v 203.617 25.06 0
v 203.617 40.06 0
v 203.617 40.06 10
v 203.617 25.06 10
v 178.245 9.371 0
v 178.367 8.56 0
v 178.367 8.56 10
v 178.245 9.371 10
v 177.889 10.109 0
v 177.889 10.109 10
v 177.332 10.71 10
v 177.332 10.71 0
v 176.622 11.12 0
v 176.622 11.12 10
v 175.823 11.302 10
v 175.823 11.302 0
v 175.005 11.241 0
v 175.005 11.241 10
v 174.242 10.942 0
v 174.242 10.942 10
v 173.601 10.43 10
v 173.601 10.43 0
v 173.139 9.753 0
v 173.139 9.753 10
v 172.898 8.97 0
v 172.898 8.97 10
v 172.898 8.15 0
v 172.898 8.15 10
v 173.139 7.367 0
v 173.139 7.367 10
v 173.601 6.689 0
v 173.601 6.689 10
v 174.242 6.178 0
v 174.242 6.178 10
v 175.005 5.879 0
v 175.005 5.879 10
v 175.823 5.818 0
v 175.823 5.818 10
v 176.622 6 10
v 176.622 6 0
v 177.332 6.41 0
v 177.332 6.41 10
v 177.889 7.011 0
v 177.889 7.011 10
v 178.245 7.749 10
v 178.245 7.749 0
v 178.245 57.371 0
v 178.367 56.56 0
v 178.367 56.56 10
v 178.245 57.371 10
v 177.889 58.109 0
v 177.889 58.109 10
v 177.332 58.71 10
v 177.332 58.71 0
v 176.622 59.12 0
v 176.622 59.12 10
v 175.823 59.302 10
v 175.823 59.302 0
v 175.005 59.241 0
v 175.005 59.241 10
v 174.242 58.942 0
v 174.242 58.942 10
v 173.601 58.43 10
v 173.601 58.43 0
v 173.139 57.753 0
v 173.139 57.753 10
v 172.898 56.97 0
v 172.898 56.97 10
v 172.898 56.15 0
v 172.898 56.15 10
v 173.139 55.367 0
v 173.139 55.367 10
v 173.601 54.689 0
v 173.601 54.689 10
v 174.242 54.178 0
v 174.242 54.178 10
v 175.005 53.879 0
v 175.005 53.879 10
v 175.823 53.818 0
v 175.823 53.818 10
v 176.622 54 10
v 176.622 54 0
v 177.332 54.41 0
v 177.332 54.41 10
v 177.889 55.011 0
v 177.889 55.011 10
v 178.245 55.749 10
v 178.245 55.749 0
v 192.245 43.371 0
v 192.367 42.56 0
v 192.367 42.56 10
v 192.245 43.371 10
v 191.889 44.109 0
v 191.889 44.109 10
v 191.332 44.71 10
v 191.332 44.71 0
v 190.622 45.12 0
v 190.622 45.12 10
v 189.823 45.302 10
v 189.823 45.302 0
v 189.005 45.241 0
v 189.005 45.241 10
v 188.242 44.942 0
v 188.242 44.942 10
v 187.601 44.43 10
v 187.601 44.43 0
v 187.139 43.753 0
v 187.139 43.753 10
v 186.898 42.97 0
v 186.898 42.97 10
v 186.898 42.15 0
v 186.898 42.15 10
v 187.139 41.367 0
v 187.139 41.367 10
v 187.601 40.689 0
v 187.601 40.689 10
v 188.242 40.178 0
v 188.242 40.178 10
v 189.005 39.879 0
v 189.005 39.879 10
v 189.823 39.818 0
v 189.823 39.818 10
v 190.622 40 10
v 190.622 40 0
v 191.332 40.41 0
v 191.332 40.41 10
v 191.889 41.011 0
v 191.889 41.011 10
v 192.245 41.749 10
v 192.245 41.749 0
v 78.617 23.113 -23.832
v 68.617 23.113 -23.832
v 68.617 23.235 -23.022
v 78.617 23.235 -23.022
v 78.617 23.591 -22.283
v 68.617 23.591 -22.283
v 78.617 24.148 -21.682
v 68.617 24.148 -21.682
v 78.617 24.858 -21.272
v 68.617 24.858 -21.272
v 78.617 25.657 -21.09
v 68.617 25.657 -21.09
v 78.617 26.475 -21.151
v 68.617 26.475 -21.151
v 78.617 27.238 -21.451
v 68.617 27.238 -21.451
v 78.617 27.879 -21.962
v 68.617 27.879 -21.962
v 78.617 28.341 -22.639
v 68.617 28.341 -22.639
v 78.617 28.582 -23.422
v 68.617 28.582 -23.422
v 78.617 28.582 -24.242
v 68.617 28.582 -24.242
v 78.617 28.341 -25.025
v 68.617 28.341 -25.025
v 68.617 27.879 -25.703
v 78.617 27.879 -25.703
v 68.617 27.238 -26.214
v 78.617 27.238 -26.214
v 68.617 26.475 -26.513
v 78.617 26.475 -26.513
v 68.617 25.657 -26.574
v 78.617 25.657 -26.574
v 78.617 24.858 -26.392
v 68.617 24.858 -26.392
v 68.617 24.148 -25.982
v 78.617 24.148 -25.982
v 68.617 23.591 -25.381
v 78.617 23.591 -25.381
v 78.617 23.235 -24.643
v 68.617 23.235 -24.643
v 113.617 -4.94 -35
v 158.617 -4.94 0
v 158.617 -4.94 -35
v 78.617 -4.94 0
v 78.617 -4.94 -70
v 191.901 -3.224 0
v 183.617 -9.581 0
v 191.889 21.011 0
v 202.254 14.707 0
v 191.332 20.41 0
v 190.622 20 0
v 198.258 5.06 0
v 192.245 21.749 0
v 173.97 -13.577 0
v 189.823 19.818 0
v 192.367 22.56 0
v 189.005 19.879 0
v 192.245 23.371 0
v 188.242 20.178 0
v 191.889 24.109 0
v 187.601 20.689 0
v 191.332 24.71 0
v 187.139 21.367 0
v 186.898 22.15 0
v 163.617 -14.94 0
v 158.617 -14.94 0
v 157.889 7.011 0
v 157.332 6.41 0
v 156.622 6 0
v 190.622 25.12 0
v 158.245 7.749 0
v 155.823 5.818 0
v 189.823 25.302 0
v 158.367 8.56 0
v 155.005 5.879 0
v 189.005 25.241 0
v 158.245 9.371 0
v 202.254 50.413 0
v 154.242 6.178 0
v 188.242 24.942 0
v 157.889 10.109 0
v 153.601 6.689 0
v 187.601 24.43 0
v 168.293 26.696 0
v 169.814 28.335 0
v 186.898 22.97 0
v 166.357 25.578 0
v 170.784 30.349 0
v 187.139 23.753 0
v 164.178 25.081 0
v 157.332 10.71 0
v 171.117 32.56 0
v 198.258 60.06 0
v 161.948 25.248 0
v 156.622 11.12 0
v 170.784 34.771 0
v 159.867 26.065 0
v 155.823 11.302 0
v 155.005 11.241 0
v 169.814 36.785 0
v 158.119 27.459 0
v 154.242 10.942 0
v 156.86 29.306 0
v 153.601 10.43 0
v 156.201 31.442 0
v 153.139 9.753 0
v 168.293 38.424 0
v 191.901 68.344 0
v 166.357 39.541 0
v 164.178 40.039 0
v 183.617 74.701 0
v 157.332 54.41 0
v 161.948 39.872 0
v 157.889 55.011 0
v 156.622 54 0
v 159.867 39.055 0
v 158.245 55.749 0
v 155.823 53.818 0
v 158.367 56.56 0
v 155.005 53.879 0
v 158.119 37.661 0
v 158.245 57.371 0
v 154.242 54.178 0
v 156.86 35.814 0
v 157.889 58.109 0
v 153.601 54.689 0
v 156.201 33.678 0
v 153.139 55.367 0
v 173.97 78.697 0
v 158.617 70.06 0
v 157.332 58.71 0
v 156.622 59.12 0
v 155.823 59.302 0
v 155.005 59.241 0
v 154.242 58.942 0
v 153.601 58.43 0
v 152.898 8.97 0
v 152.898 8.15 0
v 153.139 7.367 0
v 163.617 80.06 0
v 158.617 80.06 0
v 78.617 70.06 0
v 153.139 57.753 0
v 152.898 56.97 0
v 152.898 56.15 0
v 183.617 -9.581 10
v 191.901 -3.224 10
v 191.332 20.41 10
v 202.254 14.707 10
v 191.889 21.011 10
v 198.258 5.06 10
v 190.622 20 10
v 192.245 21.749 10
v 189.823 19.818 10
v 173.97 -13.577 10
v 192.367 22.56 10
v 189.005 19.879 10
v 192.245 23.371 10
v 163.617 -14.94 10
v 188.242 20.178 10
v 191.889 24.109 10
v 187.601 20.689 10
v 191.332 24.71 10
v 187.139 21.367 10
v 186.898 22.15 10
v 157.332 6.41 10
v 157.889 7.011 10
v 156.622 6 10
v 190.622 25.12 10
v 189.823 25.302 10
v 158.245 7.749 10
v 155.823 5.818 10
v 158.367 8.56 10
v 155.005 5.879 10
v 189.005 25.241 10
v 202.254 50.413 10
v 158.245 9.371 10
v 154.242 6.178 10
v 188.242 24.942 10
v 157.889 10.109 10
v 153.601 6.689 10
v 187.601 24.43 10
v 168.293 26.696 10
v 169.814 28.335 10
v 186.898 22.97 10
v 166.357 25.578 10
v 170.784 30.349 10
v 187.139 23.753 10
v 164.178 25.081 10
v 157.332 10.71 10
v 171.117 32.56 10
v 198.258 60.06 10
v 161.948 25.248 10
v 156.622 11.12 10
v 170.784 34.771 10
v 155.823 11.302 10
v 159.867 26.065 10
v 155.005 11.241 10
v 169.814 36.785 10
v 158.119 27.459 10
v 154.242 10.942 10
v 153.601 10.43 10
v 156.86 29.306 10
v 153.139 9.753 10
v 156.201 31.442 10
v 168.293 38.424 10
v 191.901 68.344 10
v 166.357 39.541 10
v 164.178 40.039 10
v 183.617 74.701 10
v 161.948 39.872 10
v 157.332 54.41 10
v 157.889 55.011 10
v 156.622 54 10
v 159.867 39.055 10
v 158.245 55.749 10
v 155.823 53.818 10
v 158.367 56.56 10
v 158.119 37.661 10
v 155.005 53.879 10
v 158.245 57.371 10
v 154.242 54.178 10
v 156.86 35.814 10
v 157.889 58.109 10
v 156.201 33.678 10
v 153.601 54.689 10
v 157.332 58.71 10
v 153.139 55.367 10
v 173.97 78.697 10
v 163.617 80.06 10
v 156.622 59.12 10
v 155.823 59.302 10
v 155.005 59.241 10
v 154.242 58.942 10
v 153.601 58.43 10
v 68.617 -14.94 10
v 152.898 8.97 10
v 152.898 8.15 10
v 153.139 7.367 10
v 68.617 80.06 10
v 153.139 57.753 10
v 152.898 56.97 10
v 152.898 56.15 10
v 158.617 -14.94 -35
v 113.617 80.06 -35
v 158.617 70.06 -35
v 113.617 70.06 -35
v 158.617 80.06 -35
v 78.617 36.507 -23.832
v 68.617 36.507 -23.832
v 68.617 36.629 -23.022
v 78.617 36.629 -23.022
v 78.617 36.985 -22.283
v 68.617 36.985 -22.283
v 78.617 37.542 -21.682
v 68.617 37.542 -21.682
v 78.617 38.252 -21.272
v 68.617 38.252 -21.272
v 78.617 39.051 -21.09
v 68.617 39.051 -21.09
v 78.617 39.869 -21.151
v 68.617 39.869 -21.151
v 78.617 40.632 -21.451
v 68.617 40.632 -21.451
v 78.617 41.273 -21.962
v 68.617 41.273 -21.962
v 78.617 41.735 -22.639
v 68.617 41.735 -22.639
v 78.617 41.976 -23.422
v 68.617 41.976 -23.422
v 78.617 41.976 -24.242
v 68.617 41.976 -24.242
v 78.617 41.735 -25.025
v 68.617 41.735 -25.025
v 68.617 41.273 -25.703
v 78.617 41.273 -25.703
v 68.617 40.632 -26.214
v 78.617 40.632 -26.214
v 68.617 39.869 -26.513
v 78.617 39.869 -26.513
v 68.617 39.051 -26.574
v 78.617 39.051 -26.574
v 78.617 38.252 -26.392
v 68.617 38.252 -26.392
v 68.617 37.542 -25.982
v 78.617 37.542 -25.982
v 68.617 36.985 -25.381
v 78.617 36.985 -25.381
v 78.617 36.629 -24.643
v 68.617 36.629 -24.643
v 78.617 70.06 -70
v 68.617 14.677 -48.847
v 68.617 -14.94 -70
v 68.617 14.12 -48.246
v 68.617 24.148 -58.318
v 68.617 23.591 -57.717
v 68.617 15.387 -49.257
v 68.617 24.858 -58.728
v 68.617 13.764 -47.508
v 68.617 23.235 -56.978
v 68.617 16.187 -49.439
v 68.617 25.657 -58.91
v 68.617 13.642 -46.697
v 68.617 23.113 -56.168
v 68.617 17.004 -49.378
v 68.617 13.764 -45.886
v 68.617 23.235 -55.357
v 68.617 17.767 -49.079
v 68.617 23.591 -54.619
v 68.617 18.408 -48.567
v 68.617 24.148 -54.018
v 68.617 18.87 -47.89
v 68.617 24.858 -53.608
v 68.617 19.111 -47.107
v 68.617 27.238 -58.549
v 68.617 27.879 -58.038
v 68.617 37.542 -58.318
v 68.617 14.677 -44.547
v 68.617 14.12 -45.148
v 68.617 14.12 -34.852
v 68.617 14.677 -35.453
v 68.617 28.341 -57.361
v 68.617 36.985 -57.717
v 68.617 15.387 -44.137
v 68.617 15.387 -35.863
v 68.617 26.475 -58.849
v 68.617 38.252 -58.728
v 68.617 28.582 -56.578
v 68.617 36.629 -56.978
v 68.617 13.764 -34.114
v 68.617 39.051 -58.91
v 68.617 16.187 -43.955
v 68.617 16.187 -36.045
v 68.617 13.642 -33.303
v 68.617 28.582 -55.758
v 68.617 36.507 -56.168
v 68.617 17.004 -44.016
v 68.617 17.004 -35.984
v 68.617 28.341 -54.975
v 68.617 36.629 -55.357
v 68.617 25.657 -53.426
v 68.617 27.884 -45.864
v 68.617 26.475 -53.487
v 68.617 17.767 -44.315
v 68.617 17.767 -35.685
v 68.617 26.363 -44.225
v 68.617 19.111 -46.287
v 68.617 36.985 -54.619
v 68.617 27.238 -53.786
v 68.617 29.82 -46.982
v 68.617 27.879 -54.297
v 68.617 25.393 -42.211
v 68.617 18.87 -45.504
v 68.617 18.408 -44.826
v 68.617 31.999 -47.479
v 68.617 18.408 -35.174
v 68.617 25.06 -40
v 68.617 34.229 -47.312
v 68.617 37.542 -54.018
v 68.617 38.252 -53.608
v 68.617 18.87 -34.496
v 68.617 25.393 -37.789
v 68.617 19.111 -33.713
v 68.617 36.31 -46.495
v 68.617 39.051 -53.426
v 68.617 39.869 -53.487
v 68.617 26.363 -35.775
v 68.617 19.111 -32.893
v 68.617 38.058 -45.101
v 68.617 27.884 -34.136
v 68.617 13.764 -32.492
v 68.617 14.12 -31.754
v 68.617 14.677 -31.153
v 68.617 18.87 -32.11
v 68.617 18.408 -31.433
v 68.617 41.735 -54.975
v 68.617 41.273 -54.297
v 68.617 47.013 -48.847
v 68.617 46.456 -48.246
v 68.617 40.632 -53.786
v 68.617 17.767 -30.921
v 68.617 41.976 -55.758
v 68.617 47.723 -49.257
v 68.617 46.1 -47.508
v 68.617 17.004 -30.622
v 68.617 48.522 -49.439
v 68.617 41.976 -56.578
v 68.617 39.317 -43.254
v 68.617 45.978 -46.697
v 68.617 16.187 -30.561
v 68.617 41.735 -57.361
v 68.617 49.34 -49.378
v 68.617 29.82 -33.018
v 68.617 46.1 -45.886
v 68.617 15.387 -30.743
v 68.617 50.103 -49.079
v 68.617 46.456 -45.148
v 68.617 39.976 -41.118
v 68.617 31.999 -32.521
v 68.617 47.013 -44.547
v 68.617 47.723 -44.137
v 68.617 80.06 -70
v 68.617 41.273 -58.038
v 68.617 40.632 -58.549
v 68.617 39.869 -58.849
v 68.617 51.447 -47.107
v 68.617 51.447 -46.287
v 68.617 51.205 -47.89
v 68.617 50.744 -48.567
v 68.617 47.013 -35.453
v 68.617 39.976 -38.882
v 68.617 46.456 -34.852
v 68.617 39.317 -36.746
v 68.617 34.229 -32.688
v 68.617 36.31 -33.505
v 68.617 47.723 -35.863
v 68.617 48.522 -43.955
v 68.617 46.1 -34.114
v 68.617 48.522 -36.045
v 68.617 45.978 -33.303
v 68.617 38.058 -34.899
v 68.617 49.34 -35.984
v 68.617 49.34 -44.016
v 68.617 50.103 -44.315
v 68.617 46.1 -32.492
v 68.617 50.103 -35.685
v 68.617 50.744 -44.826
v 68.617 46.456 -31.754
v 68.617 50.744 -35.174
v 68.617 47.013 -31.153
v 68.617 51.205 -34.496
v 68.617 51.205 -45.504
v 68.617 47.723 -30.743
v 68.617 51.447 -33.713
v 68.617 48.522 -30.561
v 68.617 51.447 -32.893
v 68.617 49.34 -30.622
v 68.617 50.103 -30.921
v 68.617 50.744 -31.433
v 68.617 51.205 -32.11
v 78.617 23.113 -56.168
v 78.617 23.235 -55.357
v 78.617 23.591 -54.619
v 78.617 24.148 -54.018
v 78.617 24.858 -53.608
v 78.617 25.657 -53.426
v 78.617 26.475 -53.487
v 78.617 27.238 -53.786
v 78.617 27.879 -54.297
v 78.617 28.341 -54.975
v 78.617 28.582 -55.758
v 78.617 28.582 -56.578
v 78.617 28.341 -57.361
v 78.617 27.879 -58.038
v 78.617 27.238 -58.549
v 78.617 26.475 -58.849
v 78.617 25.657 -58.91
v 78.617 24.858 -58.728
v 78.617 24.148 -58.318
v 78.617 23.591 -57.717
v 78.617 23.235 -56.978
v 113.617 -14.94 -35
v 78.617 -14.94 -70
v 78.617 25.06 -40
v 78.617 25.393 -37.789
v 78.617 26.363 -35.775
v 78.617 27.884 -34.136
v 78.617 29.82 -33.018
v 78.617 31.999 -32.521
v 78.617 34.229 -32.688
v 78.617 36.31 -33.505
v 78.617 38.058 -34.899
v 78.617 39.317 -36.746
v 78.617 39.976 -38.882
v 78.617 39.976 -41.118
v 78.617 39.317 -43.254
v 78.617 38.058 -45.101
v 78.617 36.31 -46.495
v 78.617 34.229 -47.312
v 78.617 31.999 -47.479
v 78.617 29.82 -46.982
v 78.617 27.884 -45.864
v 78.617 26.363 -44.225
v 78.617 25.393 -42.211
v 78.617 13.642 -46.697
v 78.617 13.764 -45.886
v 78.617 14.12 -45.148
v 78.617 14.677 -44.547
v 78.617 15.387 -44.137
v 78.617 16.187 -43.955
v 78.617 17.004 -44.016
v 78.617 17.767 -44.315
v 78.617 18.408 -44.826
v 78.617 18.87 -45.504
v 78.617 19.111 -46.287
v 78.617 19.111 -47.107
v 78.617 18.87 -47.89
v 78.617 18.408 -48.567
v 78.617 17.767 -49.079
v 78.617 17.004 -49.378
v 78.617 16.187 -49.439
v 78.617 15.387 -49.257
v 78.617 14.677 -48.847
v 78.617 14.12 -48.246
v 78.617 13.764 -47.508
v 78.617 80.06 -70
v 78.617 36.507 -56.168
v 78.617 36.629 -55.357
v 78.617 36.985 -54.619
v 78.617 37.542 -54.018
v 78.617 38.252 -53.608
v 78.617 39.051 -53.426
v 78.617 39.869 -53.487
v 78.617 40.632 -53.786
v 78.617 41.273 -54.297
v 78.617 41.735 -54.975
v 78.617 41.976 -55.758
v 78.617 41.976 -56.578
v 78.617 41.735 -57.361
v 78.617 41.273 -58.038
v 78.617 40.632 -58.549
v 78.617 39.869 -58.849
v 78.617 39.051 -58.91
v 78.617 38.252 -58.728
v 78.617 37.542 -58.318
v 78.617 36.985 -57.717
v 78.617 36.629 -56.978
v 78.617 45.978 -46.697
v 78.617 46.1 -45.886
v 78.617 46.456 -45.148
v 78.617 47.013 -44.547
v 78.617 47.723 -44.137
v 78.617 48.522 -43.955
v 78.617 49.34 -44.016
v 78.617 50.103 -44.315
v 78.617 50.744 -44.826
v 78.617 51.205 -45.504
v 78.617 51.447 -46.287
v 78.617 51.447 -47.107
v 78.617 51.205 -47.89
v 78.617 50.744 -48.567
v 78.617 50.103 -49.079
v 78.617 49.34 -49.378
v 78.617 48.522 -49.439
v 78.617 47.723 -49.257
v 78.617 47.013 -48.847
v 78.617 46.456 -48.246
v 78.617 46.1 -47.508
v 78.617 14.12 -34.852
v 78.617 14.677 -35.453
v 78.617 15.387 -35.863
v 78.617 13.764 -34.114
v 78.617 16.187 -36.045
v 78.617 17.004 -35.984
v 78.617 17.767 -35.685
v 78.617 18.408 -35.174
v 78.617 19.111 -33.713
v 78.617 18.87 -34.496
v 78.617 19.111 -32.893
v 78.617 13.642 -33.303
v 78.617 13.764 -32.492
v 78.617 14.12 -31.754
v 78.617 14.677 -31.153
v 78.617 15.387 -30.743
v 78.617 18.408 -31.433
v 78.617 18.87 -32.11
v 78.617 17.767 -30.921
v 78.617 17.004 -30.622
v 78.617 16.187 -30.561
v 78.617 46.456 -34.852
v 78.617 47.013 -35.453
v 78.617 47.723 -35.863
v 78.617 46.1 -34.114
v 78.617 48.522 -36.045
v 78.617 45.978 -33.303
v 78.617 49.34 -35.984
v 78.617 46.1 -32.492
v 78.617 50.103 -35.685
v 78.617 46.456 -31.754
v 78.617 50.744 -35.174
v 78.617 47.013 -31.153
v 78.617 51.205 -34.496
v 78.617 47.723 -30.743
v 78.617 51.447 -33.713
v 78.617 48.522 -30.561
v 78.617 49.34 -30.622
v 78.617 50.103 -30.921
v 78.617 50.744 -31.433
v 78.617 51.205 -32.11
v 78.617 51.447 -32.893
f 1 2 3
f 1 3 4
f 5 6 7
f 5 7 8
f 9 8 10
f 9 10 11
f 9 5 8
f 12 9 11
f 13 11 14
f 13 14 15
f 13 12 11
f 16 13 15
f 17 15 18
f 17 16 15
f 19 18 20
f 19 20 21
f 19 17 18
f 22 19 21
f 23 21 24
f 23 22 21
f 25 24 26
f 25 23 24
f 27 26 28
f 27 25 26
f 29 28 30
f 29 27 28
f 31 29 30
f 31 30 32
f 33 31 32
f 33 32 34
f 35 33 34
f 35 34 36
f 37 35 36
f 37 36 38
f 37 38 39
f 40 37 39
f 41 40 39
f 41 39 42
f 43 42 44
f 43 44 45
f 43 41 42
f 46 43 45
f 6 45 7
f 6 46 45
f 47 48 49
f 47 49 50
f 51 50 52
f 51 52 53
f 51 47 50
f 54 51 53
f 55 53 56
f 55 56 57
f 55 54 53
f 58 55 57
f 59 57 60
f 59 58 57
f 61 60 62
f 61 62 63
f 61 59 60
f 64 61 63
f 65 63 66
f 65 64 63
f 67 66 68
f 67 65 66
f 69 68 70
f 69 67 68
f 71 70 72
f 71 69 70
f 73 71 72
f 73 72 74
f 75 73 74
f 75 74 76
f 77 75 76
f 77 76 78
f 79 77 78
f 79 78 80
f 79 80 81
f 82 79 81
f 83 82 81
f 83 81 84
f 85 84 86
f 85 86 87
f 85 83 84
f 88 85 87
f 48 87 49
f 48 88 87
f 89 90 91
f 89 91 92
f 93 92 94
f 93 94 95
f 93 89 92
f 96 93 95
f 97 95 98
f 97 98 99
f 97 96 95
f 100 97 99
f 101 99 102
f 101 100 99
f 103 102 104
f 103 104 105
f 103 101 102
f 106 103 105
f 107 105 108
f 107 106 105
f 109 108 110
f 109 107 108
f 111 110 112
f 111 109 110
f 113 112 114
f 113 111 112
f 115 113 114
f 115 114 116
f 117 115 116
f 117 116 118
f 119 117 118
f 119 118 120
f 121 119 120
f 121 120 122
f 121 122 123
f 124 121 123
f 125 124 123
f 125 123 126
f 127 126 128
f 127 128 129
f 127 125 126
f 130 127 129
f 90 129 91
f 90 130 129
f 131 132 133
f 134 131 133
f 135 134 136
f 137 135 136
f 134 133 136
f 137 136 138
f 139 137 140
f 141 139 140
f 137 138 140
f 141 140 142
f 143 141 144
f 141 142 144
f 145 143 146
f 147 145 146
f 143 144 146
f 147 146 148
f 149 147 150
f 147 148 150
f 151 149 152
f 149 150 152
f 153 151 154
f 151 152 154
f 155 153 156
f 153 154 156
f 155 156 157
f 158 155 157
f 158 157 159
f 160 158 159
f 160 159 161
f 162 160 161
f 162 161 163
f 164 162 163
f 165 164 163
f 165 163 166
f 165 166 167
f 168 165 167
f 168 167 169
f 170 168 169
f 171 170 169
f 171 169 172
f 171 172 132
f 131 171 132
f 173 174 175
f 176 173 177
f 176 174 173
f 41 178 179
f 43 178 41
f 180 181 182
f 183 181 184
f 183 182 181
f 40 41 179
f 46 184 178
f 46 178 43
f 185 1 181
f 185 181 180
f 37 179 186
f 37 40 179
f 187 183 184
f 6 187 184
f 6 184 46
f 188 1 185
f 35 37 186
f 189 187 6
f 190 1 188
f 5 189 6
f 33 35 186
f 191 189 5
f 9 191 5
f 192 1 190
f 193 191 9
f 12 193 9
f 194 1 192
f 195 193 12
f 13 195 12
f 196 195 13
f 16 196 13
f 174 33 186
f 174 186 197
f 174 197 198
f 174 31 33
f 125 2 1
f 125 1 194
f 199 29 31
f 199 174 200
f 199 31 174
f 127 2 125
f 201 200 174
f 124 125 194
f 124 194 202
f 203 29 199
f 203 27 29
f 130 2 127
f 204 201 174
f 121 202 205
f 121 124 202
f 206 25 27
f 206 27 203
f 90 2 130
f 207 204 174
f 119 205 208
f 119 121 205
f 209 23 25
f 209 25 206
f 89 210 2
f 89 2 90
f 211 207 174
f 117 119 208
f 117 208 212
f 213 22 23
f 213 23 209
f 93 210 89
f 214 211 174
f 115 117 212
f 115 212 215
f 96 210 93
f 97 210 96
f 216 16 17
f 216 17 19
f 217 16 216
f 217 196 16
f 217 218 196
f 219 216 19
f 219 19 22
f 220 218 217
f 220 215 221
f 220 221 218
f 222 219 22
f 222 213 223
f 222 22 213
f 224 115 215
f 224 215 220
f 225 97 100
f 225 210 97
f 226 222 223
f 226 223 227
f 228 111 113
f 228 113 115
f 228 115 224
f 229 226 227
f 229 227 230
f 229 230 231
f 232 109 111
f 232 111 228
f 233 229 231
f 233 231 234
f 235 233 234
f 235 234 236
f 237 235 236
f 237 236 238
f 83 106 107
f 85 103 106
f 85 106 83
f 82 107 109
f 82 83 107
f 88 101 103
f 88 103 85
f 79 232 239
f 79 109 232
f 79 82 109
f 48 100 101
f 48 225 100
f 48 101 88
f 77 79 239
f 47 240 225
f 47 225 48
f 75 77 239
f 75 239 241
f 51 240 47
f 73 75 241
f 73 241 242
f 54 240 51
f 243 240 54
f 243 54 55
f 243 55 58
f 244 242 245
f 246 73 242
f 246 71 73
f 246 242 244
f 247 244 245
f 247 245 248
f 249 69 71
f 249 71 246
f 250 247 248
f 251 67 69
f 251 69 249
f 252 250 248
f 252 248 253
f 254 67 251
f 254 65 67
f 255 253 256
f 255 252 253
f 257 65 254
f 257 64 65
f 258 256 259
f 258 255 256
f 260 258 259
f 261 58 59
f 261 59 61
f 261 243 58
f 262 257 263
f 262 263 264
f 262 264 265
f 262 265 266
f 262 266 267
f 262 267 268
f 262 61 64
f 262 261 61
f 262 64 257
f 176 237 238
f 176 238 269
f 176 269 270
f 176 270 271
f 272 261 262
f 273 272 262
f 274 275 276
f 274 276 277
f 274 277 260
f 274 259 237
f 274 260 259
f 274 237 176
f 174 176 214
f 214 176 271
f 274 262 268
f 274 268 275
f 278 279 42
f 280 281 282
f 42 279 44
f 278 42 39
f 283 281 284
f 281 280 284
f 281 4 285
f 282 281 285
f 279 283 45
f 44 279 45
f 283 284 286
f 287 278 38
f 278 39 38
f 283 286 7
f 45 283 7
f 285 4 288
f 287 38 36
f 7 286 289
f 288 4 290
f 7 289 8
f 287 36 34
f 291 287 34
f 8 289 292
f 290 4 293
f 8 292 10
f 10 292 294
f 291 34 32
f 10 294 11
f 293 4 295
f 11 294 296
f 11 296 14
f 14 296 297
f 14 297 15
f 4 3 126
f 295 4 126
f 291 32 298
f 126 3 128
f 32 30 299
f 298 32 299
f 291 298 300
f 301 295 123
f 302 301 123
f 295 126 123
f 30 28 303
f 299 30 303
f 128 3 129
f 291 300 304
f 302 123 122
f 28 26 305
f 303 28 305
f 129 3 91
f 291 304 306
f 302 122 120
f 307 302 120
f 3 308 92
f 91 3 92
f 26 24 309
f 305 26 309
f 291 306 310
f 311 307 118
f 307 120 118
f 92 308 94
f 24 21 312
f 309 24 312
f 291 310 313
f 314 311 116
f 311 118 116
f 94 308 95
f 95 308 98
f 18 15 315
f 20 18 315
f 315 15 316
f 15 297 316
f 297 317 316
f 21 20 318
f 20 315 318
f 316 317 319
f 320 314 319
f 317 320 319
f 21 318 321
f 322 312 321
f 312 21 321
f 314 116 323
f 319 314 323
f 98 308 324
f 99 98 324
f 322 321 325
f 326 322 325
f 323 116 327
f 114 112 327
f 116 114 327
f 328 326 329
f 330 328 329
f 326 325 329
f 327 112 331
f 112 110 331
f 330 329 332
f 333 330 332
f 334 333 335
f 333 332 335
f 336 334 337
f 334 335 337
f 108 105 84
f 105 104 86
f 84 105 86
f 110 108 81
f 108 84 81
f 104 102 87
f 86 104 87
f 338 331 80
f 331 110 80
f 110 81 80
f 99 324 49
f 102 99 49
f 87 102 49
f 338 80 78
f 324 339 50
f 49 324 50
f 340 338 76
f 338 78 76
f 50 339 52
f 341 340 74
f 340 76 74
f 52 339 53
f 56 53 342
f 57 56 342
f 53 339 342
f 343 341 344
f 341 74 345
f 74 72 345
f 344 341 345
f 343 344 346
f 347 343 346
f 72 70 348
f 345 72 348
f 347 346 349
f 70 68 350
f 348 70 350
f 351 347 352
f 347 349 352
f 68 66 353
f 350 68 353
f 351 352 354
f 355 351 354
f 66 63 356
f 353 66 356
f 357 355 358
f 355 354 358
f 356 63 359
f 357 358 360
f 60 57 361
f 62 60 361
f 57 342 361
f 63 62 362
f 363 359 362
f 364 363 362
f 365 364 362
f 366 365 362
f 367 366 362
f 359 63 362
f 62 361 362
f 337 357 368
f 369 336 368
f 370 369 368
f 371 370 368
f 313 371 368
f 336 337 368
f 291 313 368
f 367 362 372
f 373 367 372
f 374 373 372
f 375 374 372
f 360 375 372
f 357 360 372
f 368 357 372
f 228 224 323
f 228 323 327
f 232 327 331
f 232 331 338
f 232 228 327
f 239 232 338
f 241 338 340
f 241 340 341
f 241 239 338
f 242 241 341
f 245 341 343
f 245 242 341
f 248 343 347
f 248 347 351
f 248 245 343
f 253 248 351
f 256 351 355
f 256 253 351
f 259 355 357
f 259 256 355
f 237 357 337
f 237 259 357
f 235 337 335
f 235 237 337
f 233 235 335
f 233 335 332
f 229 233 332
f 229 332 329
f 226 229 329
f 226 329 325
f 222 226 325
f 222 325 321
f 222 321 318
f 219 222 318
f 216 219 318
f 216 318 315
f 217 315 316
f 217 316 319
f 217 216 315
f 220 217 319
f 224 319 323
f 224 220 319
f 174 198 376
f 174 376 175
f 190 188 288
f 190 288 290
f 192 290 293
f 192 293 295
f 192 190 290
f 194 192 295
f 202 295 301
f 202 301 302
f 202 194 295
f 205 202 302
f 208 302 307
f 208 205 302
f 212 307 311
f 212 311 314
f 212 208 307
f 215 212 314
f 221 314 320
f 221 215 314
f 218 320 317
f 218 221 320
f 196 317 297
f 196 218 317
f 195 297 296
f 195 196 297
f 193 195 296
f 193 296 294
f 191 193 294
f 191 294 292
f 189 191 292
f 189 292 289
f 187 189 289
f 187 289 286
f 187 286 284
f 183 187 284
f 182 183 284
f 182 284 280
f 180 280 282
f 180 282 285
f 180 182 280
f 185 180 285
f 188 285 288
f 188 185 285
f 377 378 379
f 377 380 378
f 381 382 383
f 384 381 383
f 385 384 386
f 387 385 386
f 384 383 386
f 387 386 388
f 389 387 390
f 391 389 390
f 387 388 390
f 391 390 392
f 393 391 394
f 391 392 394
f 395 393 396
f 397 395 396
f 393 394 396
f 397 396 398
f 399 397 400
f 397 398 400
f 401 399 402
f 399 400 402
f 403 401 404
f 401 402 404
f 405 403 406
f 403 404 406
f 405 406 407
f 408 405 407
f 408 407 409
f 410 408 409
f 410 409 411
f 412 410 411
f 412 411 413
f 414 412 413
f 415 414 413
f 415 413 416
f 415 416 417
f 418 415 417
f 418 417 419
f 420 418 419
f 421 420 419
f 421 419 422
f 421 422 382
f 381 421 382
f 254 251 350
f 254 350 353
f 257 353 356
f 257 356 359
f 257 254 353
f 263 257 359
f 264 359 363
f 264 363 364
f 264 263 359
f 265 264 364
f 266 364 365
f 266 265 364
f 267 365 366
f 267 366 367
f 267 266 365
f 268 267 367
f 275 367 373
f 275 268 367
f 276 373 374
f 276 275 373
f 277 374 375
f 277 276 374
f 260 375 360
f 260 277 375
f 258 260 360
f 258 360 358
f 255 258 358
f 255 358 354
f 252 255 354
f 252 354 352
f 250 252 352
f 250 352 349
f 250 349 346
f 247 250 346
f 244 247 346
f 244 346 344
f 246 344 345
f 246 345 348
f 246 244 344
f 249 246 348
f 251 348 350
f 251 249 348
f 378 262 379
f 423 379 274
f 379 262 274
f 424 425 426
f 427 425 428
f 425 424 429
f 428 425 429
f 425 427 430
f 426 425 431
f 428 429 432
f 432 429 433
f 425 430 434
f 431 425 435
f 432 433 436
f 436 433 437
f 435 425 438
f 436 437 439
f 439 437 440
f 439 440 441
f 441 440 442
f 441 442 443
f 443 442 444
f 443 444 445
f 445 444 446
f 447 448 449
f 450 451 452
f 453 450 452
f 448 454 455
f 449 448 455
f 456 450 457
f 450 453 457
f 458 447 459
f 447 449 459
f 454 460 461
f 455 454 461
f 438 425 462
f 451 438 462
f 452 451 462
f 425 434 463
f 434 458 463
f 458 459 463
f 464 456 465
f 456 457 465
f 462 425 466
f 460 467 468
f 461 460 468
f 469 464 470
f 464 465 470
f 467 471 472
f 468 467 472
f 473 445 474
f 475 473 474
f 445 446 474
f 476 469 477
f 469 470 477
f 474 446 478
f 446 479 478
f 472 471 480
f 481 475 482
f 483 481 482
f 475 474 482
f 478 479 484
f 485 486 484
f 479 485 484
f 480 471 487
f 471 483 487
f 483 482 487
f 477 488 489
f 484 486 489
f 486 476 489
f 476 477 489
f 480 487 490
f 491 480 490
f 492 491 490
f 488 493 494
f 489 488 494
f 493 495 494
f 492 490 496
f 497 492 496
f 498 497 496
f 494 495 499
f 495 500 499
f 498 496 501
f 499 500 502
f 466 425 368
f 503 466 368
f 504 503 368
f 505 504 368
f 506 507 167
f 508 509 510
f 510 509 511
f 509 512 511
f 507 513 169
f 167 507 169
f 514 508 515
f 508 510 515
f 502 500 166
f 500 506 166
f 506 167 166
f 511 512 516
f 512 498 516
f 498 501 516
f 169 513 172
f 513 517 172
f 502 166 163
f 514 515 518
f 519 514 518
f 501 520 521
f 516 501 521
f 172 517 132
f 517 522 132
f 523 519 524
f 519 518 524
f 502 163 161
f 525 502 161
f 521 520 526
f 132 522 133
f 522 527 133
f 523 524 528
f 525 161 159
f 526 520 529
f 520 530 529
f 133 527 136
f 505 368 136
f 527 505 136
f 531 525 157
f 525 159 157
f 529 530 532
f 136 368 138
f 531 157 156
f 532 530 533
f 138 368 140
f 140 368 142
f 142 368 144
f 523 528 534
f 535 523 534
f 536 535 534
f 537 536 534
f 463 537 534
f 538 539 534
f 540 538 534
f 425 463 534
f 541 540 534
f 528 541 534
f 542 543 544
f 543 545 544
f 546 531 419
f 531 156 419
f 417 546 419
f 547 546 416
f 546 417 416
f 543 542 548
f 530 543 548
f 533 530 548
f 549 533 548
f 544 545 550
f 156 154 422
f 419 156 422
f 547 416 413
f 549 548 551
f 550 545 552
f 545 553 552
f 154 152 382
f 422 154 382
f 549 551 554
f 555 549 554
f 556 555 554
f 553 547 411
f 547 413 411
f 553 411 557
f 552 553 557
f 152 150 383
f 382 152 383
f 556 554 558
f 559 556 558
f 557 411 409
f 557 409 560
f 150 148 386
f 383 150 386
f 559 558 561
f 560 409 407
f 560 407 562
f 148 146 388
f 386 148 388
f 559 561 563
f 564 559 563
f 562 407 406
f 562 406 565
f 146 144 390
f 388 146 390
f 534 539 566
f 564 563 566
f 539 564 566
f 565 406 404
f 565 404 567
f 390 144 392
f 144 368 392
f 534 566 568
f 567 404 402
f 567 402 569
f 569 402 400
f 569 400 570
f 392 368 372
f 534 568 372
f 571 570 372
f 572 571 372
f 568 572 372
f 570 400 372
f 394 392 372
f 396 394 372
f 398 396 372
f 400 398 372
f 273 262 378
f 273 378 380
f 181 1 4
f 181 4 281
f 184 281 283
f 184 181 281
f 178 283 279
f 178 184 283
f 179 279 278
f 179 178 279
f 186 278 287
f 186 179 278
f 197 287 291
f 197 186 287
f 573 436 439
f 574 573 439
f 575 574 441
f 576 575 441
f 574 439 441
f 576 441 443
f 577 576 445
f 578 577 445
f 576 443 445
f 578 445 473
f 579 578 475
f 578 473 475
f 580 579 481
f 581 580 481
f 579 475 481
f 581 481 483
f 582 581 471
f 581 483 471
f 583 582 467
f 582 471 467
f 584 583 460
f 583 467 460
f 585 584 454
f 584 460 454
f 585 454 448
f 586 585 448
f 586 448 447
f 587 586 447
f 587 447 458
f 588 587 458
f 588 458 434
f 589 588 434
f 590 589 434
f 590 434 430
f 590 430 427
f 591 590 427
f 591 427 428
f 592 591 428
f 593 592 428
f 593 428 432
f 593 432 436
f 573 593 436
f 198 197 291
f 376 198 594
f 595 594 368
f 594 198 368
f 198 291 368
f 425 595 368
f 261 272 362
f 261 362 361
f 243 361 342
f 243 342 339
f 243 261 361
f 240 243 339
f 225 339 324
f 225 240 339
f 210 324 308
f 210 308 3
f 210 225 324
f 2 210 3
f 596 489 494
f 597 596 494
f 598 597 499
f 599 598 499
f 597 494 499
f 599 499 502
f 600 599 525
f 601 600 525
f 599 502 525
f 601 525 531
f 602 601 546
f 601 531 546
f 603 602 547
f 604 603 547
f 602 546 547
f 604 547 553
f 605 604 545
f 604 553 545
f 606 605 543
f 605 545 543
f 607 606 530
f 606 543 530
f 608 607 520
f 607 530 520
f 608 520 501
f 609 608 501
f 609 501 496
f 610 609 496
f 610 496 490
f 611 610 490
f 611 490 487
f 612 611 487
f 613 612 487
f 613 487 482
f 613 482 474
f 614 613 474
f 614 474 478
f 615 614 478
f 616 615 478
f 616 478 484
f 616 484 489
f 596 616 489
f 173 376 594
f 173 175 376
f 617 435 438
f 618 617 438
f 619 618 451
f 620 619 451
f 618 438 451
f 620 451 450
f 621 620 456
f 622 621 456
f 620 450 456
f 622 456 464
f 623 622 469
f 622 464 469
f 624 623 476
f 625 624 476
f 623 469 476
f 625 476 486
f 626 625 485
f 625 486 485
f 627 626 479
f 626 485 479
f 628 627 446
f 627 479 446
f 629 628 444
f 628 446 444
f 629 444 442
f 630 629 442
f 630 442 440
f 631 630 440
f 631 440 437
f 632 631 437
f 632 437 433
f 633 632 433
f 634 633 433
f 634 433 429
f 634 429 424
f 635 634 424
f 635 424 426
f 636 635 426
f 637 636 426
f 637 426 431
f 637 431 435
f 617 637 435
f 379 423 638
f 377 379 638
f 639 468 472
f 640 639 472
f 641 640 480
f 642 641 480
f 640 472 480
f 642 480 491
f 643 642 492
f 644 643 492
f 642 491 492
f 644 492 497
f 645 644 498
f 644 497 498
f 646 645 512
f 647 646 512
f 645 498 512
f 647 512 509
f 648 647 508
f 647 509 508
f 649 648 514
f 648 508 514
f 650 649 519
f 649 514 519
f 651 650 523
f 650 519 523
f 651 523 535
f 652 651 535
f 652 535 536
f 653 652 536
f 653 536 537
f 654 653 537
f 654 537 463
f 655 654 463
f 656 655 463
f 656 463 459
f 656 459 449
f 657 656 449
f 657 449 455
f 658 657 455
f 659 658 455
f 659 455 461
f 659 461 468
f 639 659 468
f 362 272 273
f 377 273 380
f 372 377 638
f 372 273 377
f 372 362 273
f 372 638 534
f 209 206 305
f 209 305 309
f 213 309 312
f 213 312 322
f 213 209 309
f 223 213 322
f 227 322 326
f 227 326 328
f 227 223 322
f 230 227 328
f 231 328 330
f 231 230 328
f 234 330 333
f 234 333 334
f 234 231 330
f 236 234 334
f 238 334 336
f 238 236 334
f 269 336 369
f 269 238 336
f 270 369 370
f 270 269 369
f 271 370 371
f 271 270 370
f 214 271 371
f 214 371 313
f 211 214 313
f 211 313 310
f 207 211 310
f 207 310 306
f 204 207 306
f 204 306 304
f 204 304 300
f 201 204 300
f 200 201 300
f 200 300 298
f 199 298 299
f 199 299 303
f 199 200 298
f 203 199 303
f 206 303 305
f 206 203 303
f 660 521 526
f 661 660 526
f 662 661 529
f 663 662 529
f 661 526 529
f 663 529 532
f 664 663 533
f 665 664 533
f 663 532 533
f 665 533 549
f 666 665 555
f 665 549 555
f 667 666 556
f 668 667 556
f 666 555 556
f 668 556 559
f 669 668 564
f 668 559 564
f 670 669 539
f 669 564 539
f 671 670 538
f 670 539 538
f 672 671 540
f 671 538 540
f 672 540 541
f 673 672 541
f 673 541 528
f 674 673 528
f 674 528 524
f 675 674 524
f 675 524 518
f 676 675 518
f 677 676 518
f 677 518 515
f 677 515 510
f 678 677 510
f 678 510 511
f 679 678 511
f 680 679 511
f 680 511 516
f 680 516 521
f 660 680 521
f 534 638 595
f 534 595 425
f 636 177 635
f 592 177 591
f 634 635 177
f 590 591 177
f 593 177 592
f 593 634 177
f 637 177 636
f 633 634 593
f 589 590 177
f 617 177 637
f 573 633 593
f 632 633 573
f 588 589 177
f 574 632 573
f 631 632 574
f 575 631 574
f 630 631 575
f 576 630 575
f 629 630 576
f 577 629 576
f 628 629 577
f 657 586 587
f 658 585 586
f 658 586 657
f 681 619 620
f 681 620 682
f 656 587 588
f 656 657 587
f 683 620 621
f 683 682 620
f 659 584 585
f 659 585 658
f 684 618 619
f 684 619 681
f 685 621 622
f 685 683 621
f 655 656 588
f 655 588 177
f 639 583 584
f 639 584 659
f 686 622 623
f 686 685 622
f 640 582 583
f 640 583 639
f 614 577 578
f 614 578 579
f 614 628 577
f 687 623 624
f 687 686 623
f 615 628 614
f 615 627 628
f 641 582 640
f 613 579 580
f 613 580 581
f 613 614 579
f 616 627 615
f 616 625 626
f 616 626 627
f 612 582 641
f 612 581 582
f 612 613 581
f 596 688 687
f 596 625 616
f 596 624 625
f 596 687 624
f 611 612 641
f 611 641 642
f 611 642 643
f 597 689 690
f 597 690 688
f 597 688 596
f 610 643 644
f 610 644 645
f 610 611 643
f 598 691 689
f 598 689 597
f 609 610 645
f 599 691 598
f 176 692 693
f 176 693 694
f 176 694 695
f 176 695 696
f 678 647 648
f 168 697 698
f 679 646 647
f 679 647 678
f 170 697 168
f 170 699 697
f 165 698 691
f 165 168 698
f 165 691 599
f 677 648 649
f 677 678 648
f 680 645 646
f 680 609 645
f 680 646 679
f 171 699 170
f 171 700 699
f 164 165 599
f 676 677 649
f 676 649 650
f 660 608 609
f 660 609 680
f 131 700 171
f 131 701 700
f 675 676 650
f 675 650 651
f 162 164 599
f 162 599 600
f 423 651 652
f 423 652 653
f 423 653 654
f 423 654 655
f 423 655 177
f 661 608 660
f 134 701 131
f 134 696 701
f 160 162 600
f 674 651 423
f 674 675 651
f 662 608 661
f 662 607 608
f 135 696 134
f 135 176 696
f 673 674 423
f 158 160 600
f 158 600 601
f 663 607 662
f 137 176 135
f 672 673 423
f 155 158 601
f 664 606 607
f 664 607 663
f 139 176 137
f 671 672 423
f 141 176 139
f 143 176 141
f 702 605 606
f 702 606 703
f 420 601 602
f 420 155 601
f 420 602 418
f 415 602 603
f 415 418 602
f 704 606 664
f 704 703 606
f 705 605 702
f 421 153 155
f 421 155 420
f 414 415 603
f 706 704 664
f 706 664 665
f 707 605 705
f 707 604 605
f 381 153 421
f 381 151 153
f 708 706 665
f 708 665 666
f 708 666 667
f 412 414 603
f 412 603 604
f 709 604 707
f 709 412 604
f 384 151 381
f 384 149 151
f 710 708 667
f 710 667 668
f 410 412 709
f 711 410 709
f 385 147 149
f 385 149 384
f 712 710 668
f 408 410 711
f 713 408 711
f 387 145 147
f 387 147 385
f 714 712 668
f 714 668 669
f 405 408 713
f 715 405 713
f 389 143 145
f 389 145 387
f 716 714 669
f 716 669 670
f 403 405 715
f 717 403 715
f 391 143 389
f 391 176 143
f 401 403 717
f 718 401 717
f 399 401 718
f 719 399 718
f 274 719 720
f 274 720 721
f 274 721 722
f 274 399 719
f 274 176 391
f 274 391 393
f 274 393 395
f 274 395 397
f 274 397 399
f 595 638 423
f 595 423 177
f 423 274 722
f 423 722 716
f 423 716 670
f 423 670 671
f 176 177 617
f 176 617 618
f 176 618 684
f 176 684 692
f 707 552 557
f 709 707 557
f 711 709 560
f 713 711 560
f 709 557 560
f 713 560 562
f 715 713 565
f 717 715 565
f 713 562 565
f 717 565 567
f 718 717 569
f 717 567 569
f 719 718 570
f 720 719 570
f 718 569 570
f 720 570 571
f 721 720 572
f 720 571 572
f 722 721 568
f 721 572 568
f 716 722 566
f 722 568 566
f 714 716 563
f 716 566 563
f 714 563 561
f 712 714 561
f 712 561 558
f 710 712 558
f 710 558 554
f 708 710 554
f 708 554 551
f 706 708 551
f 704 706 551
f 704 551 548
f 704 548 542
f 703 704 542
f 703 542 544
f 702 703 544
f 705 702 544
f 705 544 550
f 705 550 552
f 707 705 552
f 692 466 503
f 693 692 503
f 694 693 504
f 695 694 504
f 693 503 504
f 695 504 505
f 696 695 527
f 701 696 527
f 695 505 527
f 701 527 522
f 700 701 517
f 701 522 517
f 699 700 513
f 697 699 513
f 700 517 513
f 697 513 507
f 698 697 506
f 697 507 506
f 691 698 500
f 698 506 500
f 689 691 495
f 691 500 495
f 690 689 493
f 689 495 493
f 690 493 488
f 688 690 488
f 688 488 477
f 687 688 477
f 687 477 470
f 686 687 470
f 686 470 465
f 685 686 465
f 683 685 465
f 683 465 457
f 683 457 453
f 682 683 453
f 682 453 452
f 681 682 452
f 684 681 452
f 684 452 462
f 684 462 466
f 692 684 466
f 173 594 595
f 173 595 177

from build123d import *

# Parameters (mm, degrees)
SKETCH3_R           = 7.5
SKETCH3_R_2         = 2.75
BOSS_EXTRUDE1_DEPTH = 10
SKETCH4_W           = 10
SKETCH4_H           = 95
BOSS_EXTRUDE2_DEPTH = 70
SKETCH5_W           = 80
SKETCH5_H           = 10
BOSS_EXTRUDE3_DEPTH = 35
SKETCH8_R           = 7.5
SKETCH8_R_2         = 2.75
CUT_EXTRUDE2_DEPTH  = 43.8
CHAMFER1_SIZE       = 35


with BuildPart() as part:
    # Sketch3 → Boss-Extrude1 (new body)
    with BuildSketch(Plane.XY):
        with BuildLine():
            Line((68.617133813, 80.05993294), (163.617133813, 80.05993294))
            ThreePointArc((163.617133813, 80.05993294), (191.90140506, 68.344204188), (203.617133813, 40.05993294))
            Line((203.617133813, 40.05993294), (203.617133813, 25.05993294))
            ThreePointArc((203.617133813, 25.05993294), (191.90140506, -3.224338307), (163.617133813, -14.94006706))
            Line((163.617133813, -14.94006706), (68.617133813, -14.94006706))
            Line((68.617133813, -14.94006706), (68.617133813, 80.05993294))
        make_face()
        with Locations((163.617133813, 32.55993294)):
            Circle(SKETCH3_R, mode=Mode.SUBTRACT)
        with Locations((189.617133813, 42.55993294)):
            Circle(SKETCH3_R_2, mode=Mode.SUBTRACT)
        with Locations((155.617133813, 56.55993294)):
            Circle(SKETCH3_R_2, mode=Mode.SUBTRACT)
        with Locations((175.617133813, 56.55993294)):
            Circle(SKETCH3_R_2, mode=Mode.SUBTRACT)
        with Locations((155.617133813, 8.55993294)):
            Circle(SKETCH3_R_2, mode=Mode.SUBTRACT)
        with Locations((175.617133813, 8.55993294)):
            Circle(SKETCH3_R_2, mode=Mode.SUBTRACT)
        with Locations((189.617133813, 22.55993294)):
            Circle(SKETCH3_R_2, mode=Mode.SUBTRACT)
    extrude(amount=BOSS_EXTRUDE1_DEPTH)

    # Sketch4 → Boss-Extrude2 (add)
    with BuildSketch(Plane(origin=(0, 0, 0), x_dir=(-1, 0, 0), z_dir=(0, 0, -1))):
        with Locations((-73.617133813, 32.55993294)):
            Rectangle(SKETCH4_W, SKETCH4_H)
    extrude(amount=BOSS_EXTRUDE2_DEPTH)

    # Sketch5 → Boss-Extrude3 (add)
    with BuildSketch(Plane(origin=(0, 0, 0), x_dir=(-1, 0, 0), z_dir=(0, 0, -1))):
        with Locations((-118.617133813, 75.05993294)):
            Rectangle(SKETCH5_W, SKETCH5_H)
        with Locations((-118.617133813, -9.94006706)):
            Rectangle(SKETCH5_W, SKETCH5_H)
    extrude(amount=BOSS_EXTRUDE3_DEPTH)

    # Sketch8 → Cut-Extrude2 (cut)
    with BuildSketch(Plane.ZY.offset(-68.617133813)):
        with Locations(Location((-40, 32.55993294, 0), (0, 0, 270))):
            Circle(SKETCH8_R)
        with Locations(Location((-56.167891819, 25.862972874, 0), (0, 0, 270))):
            Circle(SKETCH8_R_2)
        with Locations(Location((-56.167891819, 39.256893006, 0), (0, 0, 270))):
            Circle(SKETCH8_R_2)
        with Locations(Location((-46.696960066, 48.727824759, 0), (0, 0, 270))):
            Circle(SKETCH8_R_2)
        with Locations(Location((-33.303039934, 48.727824759, 0), (0, 0, 270))):
            Circle(SKETCH8_R_2)
        with Locations(Location((-23.832108181, 39.256893006, 0), (0, 0, 270))):
            Circle(SKETCH8_R_2)
        with Locations(Location((-23.832108181, 25.862972874, 0), (0, 0, 270))):
            Circle(SKETCH8_R_2)
        with Locations(Location((-33.303039934, 16.392041121, 0), (0, 0, 270))):
            Circle(SKETCH8_R_2)
        with Locations(Location((-46.696960066, 16.392041121, 0), (0, 0, 270))):
            Circle(SKETCH8_R_2)
    extrude(amount=-CUT_EXTRUDE2_DEPTH, mode=Mode.SUBTRACT)

    # Chamfer1
    chamfer1_edges = [part.edges().sort_by_distance(p)[0] for p in [
        (78.617133813, 75.05993294, -35),
        (78.617133813, -9.94006706, -35),
    ]]
    chamfer(chamfer1_edges, length=CHAMFER1_SIZE - 0.0001)  # a hair under: the kernel refuses the full size


solid = part.part
